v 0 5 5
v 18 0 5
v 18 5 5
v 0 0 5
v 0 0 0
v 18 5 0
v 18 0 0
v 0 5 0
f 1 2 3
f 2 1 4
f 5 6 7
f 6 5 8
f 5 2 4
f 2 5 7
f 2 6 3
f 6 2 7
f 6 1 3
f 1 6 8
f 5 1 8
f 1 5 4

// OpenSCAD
// string escapes; geometry sized from a string-derived value so this still
// renders without needing font assets (text() needs addFonts(), see spike notes)
label1 = "line1\nline2\ttabbed";
label2 = "quote: \" backslash: \\ unicode: é";
echo(label1, label2, str("value = ", 42));

cube([len(label1), 5, 5]);
